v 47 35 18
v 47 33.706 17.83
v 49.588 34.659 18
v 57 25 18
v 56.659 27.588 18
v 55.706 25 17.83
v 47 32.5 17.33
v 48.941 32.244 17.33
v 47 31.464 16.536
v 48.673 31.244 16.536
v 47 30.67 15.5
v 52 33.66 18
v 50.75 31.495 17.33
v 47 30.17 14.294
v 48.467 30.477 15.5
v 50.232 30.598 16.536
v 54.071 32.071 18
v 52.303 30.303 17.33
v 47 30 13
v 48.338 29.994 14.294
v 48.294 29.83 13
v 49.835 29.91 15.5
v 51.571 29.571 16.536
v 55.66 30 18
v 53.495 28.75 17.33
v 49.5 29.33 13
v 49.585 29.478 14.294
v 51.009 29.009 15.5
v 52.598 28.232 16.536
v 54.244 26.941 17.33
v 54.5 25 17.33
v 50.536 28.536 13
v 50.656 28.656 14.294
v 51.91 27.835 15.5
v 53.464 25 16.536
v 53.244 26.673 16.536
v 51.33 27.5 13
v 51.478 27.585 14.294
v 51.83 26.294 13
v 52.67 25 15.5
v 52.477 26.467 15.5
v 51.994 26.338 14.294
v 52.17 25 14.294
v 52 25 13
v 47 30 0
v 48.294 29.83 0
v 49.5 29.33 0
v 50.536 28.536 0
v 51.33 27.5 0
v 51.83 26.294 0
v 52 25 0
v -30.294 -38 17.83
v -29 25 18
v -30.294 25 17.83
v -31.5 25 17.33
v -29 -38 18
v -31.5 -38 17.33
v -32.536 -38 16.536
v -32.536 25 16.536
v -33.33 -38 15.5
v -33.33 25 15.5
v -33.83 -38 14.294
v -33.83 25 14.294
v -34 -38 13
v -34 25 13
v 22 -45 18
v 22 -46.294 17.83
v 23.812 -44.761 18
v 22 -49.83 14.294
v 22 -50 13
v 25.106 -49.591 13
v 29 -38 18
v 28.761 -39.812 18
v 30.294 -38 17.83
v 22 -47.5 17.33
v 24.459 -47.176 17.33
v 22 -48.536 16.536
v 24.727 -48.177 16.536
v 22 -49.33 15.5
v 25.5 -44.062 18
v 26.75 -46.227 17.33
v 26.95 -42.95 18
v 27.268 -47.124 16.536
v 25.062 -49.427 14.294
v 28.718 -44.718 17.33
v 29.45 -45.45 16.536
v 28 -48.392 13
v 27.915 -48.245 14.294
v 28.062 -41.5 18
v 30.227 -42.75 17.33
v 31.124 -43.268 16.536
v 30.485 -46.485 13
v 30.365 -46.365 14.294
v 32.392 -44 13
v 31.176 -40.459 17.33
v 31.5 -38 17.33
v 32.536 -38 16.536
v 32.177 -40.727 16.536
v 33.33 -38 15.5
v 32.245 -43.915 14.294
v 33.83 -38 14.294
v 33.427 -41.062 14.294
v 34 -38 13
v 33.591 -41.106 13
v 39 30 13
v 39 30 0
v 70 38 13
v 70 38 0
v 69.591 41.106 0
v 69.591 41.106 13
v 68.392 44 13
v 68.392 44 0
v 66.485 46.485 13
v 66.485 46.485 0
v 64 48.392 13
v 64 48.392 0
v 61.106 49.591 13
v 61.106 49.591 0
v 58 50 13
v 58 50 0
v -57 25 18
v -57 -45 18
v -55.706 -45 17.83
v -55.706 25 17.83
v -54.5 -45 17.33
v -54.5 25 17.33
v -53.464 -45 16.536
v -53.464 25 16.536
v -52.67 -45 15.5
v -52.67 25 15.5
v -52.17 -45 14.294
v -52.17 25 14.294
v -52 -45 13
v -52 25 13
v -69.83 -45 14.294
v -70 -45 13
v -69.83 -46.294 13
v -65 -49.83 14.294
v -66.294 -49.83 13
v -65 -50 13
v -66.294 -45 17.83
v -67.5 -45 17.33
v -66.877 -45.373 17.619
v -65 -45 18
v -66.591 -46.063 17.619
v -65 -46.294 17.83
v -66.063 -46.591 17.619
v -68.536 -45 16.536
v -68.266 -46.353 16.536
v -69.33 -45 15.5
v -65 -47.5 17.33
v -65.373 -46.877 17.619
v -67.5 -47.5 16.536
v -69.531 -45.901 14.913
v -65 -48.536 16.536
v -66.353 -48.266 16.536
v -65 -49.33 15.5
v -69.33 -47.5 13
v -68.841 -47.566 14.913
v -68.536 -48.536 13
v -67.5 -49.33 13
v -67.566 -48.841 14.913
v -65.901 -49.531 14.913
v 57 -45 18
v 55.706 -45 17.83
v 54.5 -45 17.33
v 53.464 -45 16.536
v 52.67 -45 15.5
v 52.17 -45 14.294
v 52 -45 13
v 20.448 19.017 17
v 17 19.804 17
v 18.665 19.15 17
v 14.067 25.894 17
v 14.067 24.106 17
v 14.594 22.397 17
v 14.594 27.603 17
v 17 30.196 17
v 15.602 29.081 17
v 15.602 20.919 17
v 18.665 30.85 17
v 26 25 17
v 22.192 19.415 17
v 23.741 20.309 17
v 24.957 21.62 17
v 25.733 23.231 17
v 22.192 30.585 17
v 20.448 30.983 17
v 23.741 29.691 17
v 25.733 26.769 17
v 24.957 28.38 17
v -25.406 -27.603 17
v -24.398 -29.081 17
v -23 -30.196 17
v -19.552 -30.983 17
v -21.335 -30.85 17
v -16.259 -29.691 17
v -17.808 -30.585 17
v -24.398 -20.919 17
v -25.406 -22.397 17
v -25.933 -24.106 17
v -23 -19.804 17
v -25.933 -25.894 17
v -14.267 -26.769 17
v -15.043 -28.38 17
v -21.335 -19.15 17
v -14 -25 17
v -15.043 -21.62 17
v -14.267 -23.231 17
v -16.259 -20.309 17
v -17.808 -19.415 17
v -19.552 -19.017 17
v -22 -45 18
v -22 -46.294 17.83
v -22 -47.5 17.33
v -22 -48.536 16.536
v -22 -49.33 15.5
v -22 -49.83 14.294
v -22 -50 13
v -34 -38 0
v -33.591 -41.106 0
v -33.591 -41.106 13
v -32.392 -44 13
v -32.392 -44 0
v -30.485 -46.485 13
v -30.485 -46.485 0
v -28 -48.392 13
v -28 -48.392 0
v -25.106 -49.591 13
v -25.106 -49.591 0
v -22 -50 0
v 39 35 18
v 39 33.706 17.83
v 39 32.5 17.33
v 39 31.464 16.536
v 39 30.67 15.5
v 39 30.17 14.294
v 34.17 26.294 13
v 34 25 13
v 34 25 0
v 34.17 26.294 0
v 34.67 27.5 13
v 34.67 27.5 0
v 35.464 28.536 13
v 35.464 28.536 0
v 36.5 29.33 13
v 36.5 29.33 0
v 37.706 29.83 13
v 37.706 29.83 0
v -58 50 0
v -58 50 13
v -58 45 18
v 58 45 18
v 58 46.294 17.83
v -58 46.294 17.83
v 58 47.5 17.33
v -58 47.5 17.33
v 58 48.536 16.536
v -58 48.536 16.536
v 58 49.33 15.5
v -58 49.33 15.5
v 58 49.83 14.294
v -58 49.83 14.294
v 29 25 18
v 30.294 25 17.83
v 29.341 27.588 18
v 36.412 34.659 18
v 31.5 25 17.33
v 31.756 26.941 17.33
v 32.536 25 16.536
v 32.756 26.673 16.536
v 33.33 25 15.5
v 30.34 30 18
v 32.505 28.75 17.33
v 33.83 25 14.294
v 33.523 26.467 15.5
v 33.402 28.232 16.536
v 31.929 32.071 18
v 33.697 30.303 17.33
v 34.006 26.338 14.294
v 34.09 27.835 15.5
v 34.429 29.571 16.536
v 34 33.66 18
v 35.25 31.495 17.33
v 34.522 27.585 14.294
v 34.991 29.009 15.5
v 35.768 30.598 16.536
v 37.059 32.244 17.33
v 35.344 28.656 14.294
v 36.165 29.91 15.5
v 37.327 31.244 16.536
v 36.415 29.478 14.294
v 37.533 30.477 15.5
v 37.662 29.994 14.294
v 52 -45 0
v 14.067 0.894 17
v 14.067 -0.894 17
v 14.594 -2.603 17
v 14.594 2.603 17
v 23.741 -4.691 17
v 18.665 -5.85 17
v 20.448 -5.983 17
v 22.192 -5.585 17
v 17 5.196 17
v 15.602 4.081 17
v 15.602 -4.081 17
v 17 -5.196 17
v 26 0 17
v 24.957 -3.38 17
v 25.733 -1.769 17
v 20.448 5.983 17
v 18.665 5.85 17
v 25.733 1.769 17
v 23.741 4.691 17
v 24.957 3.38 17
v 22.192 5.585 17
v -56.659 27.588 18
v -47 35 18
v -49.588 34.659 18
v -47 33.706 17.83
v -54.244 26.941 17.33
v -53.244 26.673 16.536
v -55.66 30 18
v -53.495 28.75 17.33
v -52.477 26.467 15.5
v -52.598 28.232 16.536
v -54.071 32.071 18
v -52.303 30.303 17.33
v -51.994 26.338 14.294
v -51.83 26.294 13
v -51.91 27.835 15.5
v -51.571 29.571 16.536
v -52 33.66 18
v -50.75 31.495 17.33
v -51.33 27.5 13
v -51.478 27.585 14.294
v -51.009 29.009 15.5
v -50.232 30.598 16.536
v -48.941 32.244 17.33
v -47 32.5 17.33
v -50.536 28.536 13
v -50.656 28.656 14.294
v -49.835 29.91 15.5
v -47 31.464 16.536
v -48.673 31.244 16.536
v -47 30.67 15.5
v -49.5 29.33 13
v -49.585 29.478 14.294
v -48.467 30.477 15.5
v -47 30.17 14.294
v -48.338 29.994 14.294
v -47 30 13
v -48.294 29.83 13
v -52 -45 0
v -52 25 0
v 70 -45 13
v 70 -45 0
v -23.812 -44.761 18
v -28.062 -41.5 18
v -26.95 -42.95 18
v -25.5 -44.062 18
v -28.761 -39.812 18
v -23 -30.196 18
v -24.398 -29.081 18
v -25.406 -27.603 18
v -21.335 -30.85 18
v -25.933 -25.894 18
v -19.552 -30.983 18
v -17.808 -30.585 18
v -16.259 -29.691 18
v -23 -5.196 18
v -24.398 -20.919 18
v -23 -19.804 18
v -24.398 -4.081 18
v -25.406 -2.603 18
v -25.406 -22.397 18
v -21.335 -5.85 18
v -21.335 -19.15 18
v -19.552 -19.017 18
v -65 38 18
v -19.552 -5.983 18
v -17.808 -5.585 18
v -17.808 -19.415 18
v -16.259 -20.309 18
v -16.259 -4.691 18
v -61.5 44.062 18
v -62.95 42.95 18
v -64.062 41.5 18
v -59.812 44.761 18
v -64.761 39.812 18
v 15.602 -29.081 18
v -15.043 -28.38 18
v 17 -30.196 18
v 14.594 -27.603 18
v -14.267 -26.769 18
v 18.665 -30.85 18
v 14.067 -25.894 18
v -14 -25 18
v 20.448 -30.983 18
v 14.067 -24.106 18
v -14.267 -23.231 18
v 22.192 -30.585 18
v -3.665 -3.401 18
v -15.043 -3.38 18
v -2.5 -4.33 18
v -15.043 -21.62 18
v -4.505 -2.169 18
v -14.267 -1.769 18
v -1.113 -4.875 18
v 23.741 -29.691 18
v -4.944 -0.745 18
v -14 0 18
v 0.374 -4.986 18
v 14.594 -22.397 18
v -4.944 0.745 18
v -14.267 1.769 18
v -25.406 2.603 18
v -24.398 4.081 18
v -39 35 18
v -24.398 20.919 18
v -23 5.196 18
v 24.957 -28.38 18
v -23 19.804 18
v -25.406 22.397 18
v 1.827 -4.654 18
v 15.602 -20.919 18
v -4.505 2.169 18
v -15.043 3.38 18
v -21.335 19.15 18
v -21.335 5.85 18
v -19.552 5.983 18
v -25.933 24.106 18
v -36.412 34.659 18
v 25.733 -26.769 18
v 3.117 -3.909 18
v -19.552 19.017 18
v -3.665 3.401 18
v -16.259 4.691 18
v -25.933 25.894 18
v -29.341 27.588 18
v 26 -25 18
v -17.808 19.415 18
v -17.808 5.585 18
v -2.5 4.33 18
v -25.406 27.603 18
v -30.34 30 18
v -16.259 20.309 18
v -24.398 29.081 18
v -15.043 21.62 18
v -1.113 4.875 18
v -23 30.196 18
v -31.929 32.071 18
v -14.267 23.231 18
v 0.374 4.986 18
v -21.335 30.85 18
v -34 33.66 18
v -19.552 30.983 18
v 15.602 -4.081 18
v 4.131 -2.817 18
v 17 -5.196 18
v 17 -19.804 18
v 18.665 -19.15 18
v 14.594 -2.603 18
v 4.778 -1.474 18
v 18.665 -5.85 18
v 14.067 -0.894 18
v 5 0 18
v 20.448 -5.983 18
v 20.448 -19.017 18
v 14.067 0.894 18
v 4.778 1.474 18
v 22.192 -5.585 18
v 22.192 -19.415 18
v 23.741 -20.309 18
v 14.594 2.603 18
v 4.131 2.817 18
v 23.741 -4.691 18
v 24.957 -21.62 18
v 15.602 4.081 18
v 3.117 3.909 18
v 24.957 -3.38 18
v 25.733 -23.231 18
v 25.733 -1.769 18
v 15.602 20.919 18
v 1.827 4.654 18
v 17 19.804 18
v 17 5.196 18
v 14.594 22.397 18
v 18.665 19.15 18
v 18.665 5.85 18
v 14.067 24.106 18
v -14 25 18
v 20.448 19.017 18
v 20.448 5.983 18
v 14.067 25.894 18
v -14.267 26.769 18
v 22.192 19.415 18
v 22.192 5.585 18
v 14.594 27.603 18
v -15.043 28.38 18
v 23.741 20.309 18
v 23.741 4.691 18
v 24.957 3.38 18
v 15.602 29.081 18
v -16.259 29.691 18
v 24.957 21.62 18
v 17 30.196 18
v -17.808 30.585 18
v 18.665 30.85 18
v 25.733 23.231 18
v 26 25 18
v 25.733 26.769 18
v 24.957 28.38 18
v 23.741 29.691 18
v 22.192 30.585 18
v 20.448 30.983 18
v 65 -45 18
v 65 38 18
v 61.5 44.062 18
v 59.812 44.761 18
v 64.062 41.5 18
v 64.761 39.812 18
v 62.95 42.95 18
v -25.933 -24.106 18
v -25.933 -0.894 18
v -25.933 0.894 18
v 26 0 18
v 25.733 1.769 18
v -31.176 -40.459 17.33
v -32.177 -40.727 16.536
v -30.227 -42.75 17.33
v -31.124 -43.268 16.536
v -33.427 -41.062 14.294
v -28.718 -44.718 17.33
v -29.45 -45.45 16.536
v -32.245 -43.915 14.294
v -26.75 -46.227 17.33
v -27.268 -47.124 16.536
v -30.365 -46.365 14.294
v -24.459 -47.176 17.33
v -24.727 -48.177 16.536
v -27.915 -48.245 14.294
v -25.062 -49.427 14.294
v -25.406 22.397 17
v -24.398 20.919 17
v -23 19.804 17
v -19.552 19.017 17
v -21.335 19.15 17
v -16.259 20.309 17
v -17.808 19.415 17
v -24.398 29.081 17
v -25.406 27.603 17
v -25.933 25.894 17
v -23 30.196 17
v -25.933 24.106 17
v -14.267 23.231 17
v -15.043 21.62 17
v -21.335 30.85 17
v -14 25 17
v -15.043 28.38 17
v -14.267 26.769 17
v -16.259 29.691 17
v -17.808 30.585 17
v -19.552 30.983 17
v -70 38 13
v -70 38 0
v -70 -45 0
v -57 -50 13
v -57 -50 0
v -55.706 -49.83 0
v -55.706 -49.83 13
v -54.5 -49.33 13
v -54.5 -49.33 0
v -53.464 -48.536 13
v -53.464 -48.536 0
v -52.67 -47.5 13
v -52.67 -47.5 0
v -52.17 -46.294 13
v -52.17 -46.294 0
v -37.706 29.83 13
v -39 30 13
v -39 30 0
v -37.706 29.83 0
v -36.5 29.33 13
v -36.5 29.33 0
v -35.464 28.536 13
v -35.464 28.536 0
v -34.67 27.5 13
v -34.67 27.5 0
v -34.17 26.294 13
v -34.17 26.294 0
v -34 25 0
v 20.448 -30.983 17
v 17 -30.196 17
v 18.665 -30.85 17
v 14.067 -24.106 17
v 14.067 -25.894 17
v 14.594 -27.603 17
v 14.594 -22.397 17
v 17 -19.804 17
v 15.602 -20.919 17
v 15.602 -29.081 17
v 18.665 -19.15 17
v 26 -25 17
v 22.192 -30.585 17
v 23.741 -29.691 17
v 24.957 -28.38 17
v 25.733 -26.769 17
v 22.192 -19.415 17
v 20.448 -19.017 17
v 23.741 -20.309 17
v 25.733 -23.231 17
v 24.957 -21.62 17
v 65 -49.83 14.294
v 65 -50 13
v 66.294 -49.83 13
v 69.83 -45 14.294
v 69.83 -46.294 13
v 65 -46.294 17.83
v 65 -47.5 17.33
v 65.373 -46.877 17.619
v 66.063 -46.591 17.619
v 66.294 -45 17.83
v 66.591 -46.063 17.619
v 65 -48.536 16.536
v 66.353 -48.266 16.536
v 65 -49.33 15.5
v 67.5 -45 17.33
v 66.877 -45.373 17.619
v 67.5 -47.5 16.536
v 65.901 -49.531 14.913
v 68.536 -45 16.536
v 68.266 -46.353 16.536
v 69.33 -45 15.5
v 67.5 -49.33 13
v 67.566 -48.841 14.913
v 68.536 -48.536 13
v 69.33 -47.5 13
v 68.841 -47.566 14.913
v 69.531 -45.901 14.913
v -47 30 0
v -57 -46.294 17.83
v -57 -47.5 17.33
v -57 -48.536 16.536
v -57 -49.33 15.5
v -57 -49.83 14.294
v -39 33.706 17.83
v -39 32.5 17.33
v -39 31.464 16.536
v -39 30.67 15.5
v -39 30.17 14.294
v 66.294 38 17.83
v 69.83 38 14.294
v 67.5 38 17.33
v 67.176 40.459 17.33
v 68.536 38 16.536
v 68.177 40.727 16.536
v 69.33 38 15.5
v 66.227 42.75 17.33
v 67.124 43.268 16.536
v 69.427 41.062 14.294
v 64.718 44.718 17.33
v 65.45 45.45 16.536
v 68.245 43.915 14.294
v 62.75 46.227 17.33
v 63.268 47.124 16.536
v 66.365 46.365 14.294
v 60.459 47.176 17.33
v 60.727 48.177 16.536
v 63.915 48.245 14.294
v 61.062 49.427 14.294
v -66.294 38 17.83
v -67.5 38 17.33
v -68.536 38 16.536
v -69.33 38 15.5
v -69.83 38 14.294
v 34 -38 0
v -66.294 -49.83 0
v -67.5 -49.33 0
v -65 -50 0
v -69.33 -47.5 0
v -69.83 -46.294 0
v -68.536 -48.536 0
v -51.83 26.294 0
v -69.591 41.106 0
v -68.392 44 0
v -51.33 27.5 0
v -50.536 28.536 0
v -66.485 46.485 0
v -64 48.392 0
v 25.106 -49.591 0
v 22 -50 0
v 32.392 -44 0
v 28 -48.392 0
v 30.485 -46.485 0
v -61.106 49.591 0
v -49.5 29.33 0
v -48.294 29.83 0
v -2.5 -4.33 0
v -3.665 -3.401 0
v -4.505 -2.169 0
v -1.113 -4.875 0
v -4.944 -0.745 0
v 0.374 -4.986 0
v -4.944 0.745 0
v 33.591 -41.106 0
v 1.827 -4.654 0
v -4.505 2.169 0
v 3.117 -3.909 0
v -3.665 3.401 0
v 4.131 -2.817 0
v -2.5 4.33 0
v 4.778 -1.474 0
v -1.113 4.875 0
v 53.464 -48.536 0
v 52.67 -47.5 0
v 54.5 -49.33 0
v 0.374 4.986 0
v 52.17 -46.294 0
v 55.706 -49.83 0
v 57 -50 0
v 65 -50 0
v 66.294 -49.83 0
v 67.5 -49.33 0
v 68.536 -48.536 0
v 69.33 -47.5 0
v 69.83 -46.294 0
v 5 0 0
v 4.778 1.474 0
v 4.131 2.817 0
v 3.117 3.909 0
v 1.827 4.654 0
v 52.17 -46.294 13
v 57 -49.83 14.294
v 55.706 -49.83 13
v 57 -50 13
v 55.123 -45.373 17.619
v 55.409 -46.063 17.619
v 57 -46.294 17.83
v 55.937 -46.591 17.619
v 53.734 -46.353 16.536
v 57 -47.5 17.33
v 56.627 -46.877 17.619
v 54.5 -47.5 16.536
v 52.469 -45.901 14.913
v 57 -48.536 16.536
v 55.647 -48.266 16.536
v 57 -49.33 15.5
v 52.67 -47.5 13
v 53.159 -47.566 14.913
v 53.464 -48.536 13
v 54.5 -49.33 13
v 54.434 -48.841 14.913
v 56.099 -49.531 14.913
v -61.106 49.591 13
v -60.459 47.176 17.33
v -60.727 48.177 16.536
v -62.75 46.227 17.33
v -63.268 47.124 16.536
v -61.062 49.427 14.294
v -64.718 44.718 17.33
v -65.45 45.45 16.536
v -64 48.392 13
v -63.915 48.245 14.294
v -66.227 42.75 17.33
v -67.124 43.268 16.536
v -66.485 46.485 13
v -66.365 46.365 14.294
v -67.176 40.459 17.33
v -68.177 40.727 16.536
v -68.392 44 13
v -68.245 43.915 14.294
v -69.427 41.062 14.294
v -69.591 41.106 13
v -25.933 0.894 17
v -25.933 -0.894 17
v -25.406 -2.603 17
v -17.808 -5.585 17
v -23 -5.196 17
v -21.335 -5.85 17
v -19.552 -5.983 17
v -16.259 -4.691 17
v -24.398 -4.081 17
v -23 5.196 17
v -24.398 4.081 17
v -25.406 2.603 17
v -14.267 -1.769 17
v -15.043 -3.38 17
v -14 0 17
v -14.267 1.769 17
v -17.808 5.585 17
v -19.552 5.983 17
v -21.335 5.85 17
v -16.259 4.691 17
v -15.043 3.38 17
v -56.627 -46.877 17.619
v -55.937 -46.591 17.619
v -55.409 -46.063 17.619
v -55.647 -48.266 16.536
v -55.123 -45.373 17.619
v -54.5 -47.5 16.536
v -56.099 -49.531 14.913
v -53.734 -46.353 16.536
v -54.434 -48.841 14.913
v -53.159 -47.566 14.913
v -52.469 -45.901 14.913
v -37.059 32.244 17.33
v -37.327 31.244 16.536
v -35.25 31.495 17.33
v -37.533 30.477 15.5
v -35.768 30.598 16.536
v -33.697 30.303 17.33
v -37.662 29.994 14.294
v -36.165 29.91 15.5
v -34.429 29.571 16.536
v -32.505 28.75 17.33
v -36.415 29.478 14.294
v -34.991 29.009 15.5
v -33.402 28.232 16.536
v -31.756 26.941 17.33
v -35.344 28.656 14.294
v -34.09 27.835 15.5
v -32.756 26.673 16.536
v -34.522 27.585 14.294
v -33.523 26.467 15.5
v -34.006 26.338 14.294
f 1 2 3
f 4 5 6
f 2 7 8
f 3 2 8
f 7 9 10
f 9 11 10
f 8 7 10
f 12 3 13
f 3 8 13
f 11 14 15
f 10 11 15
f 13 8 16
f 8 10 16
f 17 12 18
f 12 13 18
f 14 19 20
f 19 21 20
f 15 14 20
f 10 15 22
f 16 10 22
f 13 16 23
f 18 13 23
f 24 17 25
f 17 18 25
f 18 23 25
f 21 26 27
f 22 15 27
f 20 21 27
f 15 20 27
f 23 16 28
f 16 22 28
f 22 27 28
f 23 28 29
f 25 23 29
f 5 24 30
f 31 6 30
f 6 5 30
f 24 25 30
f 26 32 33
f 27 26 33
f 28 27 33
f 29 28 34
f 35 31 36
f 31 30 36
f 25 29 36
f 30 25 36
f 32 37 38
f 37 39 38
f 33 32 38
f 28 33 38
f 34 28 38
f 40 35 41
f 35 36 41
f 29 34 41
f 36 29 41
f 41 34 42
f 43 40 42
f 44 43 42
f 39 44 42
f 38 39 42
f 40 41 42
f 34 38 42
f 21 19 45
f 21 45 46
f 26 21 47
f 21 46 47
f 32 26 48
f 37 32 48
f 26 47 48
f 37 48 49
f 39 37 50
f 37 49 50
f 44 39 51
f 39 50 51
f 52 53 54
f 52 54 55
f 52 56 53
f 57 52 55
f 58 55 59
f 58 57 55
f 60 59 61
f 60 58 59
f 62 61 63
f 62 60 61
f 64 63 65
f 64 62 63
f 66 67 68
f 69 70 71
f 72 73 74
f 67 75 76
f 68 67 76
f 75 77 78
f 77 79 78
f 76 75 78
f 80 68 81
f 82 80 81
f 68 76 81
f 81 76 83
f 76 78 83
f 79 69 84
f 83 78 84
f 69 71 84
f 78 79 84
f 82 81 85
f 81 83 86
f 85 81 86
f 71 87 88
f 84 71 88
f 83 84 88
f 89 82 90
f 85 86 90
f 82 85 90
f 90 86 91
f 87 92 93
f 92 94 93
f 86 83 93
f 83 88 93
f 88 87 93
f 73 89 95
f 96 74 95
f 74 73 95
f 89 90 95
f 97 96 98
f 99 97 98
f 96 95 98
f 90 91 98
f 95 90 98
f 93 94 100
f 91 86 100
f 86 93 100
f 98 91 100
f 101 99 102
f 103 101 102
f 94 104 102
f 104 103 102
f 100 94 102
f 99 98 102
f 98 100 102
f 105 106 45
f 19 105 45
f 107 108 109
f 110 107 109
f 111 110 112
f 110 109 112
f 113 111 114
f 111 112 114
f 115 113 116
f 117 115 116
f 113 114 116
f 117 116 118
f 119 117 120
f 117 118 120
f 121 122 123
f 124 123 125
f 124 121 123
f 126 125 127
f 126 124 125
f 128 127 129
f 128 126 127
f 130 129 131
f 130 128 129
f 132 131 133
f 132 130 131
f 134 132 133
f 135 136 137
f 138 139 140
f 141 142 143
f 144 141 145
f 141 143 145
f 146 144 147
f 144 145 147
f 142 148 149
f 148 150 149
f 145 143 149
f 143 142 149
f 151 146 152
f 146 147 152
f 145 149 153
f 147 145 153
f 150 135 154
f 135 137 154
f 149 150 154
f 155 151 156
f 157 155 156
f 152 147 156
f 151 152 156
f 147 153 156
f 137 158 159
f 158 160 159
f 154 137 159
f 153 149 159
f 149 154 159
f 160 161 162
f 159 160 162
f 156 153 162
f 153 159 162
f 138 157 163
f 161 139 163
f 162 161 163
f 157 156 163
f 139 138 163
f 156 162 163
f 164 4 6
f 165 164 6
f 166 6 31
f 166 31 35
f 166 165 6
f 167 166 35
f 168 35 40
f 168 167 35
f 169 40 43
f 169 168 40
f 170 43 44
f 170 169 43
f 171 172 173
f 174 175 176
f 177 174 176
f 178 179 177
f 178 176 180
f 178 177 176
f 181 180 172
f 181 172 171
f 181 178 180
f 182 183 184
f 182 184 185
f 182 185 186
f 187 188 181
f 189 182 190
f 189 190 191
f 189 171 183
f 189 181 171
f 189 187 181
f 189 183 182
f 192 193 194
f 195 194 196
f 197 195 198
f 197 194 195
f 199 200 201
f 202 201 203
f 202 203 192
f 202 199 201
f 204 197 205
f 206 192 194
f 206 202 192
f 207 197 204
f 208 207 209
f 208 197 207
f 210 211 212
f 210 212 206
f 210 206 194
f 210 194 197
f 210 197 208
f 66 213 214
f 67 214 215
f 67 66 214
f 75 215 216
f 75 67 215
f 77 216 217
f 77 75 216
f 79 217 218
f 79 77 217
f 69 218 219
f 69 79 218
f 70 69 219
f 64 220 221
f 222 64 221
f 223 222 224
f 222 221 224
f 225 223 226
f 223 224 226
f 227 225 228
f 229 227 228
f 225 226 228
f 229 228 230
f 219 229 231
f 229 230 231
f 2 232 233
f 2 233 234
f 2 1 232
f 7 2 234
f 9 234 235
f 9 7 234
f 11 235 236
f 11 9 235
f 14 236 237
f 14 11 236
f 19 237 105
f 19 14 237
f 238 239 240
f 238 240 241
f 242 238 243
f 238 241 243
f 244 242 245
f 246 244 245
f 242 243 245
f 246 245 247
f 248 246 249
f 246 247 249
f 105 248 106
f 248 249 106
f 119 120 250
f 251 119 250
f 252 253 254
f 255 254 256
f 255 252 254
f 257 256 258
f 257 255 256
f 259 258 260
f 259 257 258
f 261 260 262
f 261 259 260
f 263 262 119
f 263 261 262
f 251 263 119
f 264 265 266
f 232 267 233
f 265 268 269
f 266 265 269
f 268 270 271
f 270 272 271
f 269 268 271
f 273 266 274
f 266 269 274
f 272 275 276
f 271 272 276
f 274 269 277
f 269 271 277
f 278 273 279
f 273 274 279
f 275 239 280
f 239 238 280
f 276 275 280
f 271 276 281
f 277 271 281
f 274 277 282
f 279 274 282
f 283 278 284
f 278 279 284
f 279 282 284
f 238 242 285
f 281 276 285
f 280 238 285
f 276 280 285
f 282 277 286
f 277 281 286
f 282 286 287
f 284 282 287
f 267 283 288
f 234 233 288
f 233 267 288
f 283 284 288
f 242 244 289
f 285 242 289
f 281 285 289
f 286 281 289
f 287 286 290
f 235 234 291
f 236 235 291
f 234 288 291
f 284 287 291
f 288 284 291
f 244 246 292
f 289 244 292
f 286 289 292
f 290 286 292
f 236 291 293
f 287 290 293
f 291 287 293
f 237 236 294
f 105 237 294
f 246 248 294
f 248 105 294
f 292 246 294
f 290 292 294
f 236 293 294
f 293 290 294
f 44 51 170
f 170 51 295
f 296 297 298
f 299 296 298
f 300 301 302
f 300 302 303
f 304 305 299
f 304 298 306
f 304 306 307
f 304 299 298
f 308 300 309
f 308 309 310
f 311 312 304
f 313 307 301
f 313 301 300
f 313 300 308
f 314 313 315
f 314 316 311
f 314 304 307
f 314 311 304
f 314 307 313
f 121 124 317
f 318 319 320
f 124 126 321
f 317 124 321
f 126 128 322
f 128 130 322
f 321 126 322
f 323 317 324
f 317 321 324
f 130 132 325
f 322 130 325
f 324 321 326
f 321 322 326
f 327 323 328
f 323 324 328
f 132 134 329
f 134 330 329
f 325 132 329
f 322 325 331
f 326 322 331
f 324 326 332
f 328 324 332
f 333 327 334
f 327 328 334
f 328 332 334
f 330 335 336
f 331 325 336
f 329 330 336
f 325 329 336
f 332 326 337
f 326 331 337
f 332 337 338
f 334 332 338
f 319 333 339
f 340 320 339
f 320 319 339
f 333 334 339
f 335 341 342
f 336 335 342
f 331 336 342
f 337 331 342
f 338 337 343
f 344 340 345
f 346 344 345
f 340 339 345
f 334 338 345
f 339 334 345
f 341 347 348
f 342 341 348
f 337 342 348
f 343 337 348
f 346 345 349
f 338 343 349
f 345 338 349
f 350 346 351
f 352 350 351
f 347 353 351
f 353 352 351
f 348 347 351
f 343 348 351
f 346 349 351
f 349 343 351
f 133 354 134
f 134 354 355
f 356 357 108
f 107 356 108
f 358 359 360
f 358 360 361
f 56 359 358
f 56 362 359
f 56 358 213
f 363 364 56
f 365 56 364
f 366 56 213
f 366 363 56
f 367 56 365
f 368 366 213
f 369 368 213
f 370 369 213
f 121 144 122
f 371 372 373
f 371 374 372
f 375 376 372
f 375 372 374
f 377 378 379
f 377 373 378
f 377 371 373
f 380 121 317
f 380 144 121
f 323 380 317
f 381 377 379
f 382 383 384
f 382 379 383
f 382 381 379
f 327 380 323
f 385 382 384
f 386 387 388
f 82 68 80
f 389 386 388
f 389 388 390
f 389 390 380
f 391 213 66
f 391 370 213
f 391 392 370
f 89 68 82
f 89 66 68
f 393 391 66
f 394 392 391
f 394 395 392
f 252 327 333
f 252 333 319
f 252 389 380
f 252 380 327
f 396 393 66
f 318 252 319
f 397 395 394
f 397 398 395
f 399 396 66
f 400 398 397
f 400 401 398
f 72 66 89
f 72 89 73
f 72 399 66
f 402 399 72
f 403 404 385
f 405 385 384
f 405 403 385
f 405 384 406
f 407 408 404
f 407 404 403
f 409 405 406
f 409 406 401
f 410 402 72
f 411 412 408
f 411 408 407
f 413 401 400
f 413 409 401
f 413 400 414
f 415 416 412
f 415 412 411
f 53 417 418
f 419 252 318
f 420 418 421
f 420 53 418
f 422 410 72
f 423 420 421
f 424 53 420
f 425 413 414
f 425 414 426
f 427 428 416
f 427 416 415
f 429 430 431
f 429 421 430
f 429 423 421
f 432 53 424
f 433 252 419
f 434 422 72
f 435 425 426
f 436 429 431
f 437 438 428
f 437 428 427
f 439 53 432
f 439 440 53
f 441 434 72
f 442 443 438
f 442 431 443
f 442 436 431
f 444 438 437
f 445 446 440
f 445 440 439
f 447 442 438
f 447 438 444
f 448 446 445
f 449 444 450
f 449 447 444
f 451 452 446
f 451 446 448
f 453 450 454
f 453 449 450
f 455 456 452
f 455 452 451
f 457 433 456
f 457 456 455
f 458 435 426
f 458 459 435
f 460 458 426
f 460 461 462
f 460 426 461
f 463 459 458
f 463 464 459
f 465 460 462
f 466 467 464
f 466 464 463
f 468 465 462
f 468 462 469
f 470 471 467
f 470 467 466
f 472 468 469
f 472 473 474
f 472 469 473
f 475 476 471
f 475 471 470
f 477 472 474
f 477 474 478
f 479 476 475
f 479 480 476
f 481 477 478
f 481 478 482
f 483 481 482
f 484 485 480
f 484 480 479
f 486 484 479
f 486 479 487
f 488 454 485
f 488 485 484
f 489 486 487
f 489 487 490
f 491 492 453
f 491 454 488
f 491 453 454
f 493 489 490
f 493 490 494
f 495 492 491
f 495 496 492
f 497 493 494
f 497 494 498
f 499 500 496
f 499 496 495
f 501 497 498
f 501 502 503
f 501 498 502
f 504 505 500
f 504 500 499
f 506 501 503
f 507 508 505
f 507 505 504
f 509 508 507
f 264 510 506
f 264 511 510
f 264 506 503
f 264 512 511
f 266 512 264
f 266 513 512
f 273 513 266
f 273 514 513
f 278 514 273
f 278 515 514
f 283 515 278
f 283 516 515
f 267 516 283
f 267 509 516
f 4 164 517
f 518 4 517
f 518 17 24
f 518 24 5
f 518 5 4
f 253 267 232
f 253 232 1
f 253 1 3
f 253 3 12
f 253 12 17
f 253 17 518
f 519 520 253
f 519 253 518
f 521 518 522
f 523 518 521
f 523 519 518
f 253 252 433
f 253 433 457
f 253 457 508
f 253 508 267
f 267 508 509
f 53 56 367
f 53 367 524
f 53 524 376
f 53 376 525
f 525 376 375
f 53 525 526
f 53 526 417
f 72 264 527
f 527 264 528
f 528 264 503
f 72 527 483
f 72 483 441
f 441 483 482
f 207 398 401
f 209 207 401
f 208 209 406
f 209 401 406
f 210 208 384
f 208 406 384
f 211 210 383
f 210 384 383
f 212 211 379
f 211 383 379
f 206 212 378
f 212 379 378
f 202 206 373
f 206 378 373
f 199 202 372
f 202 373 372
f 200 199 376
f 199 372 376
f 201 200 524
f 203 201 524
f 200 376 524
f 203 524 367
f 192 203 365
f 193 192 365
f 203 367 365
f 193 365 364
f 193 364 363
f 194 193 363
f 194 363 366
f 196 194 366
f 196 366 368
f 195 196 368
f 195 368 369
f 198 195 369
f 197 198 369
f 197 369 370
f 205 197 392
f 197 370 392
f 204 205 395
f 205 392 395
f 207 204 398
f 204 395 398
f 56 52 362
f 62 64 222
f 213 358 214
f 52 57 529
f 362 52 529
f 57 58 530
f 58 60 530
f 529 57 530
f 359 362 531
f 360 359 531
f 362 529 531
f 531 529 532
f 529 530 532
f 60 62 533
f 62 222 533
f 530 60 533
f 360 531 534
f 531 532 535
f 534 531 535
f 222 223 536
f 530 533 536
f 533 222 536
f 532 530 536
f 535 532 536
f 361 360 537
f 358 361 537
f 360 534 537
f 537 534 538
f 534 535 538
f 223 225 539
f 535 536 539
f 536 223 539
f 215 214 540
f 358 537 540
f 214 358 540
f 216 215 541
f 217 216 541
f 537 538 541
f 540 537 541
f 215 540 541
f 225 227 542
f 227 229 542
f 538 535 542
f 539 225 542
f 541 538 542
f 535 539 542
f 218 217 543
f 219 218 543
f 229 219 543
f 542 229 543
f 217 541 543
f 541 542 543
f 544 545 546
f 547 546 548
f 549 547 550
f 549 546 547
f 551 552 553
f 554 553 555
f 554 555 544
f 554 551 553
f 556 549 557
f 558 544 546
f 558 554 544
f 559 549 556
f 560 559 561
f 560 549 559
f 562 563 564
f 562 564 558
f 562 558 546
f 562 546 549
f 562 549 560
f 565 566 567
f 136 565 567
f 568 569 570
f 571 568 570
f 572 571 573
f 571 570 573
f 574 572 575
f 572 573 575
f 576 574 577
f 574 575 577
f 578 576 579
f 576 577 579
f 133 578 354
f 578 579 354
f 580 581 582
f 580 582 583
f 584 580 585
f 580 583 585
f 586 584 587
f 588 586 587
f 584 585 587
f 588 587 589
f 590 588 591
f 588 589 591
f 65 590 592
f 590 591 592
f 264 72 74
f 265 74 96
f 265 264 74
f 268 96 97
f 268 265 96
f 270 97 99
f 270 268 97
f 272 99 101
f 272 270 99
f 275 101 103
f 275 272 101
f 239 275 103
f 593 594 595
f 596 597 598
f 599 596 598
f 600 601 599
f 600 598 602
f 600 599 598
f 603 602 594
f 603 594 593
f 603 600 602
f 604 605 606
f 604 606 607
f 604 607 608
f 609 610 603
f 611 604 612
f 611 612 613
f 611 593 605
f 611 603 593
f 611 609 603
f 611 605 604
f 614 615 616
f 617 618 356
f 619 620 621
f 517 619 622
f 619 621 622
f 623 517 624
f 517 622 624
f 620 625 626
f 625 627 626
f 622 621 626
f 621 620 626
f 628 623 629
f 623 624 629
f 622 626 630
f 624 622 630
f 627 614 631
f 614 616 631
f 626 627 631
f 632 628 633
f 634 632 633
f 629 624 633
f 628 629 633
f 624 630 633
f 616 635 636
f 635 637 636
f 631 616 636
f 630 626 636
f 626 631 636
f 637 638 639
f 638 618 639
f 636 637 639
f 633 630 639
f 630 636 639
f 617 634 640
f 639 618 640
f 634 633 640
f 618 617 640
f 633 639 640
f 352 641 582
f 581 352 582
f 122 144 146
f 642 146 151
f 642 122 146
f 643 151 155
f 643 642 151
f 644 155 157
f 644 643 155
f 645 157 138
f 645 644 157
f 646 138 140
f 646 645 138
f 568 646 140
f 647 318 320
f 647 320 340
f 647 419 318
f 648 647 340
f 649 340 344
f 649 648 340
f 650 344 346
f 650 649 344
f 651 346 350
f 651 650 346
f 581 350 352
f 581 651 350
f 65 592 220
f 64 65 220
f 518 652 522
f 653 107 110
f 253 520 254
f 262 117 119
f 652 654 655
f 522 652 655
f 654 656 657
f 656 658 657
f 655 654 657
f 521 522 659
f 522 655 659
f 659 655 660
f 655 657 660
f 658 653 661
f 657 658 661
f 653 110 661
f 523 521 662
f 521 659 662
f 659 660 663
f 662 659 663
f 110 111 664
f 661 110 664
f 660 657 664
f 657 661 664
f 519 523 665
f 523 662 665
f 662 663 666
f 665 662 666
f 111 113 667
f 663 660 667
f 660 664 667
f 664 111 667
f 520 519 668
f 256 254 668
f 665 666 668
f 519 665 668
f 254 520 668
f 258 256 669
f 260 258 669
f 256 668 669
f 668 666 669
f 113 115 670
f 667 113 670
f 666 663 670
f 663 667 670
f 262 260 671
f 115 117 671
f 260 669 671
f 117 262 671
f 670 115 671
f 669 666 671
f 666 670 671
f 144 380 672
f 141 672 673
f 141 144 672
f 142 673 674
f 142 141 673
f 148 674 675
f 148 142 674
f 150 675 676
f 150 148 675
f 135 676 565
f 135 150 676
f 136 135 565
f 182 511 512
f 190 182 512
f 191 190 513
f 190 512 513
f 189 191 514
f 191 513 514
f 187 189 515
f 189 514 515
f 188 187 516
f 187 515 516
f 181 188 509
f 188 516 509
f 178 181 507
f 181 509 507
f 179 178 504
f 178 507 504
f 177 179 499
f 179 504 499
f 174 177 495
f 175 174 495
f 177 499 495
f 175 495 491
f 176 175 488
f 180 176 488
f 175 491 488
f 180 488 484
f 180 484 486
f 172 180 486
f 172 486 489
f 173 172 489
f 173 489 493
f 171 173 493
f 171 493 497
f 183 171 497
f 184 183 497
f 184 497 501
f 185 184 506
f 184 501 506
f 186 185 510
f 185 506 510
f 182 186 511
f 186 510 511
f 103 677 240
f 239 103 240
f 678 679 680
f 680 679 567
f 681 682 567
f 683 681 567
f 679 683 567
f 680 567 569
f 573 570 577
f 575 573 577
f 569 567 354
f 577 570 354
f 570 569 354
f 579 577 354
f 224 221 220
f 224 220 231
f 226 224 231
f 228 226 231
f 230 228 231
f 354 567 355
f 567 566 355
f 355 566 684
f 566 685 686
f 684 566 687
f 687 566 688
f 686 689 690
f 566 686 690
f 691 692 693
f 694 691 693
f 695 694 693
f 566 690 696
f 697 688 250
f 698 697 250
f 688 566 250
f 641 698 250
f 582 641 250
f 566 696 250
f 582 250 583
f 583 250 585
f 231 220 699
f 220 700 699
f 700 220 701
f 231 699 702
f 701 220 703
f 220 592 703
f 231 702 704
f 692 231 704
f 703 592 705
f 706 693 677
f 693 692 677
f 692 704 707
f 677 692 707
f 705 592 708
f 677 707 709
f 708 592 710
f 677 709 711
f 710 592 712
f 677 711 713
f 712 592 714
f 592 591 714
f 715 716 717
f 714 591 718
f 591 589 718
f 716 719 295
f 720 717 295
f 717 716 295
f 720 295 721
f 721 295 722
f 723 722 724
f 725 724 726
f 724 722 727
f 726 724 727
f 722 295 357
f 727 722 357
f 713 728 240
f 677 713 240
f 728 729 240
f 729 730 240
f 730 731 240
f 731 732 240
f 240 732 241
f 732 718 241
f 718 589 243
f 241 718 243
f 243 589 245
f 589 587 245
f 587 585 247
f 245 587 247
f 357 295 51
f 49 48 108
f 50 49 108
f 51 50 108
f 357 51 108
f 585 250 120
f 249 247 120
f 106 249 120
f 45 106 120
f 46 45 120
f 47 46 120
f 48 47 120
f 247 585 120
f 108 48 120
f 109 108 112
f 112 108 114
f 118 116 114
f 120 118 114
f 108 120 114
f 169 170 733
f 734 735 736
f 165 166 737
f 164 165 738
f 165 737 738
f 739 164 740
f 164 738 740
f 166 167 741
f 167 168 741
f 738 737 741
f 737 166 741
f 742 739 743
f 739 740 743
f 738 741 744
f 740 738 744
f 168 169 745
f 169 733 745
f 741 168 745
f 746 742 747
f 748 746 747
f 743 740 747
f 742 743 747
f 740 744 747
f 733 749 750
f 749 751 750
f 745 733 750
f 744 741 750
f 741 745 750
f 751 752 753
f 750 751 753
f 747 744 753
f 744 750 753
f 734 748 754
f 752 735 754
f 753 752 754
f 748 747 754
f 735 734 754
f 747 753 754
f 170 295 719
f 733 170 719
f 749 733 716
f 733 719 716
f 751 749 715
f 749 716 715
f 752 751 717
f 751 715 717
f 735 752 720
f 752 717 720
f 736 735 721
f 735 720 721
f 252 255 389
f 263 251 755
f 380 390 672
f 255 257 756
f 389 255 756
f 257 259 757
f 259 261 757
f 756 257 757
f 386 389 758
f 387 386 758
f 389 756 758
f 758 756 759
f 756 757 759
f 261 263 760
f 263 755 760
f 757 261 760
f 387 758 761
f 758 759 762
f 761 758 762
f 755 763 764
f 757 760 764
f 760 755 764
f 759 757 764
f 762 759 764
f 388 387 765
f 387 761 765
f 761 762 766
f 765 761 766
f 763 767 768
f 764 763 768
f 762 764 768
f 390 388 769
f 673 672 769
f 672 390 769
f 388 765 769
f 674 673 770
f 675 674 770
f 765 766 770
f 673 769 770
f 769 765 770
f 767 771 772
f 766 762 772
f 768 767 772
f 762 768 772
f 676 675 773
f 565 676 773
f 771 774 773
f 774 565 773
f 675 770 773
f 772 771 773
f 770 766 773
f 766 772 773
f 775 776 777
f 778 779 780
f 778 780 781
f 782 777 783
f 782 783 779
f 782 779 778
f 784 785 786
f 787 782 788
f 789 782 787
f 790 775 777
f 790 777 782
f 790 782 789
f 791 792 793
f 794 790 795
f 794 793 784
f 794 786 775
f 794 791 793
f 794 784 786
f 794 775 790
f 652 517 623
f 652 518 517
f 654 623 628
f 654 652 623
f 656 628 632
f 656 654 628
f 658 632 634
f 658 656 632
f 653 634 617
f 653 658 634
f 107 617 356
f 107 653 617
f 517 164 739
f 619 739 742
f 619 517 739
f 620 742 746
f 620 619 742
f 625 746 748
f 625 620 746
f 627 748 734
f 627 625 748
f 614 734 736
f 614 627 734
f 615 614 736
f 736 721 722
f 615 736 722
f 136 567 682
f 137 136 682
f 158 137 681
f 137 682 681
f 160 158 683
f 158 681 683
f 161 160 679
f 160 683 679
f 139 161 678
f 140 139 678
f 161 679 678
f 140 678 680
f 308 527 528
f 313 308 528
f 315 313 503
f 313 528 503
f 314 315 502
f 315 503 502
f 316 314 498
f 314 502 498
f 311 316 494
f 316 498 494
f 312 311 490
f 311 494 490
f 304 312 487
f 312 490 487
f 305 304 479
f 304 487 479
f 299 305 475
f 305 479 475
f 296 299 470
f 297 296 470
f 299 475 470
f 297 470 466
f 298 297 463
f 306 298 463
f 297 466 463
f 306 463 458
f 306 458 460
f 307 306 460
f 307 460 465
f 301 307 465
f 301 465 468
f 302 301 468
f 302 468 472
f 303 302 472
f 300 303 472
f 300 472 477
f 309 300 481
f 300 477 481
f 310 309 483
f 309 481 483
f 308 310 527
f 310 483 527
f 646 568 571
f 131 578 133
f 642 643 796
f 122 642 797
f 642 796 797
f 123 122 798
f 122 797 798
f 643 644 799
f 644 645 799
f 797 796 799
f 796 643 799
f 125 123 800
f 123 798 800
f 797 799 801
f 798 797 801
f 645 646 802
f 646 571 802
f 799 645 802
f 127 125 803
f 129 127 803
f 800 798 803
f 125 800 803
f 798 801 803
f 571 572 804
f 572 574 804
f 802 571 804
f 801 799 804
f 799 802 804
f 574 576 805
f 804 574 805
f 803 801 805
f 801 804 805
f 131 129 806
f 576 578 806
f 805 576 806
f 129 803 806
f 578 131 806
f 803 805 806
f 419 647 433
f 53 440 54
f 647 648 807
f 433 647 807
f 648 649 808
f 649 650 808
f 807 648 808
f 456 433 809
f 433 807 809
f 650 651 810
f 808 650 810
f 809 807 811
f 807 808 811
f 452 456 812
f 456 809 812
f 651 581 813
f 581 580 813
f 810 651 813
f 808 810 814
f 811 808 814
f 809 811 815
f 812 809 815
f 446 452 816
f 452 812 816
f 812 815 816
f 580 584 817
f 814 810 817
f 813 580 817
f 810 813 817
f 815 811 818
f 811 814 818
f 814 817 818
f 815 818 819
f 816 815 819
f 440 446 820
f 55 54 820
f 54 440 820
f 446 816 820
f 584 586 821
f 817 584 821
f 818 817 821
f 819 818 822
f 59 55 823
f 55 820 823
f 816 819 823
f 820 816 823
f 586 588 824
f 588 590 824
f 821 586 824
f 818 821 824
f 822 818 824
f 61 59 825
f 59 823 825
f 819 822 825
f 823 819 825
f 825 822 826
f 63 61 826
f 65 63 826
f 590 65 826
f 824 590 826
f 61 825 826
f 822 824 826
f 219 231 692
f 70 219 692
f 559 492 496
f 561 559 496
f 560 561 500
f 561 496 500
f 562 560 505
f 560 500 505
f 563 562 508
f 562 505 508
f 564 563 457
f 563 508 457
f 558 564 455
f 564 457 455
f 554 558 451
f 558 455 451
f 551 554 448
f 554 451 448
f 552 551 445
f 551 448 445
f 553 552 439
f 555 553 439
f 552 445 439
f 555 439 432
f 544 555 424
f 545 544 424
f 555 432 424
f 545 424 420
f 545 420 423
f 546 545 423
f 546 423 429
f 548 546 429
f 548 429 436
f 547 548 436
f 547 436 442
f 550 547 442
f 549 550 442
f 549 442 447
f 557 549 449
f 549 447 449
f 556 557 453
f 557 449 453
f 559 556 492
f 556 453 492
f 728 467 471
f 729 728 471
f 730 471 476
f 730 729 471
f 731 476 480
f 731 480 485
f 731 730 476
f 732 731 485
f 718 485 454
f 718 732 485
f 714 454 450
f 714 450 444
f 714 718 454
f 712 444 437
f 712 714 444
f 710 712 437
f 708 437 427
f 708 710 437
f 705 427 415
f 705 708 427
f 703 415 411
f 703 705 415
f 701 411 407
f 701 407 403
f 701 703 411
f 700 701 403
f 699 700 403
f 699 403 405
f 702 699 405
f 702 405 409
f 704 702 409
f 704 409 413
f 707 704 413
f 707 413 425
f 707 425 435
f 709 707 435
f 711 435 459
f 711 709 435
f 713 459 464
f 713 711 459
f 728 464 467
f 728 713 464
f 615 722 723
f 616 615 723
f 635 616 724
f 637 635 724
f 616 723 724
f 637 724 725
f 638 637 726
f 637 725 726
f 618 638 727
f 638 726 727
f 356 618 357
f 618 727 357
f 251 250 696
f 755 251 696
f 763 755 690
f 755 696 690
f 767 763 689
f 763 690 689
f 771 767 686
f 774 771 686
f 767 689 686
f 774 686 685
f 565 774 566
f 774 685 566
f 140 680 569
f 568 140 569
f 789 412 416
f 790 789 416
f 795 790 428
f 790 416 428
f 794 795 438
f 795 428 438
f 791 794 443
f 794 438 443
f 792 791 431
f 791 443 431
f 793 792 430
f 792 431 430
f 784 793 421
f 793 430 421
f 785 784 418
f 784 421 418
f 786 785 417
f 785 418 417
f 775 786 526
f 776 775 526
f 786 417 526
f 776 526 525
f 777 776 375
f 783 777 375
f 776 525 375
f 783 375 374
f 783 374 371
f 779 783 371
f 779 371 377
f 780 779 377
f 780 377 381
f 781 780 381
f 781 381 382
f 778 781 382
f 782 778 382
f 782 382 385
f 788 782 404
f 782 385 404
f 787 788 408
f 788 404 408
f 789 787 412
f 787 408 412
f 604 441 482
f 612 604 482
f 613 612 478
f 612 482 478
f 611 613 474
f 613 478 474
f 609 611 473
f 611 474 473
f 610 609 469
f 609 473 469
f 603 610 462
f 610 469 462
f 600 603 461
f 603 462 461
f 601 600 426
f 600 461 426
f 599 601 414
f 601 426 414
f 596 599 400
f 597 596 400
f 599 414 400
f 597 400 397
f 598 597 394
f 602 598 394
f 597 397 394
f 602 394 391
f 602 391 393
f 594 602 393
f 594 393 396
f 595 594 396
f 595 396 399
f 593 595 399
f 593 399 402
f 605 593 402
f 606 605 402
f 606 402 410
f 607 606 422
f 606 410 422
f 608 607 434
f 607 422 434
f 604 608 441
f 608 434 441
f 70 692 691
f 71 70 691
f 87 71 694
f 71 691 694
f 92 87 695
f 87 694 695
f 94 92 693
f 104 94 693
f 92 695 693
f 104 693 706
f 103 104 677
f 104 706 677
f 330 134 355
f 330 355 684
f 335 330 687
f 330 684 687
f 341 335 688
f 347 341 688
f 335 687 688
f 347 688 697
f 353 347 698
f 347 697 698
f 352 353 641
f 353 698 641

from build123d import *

# Parameters (mm, degrees)
F0_R     = 5
F1_DEPTH = 18
F2_R     = 6
F3_DEPTH = 1
F4_R     = 5


with BuildPart() as f1:
    # F0 (on Top) → F1 (new body)
    with BuildSketch(Plane.XY):
        with BuildLine():
            Line((0, -50), (22, -50))
            ThreePointArc((22, -50), (30.4852813742, -46.4852813742), (34, -38))
            Line((34, -38), (34, 25))
            ThreePointArc((34, 25), (35.4644660941, 28.5355339059), (39, 30))
            Line((39, 30), (47, 30))
            ThreePointArc((47, 30), (50.5355339059, 28.5355339059), (52, 25))
            Line((52, 25), (52, -45))
            ThreePointArc((52, -45), (53.4644660941, -48.5355339059), (57, -50))
            Line((57, -50), (65, -50))
            ThreePointArc((65, -50), (68.5355339059, -48.5355339059), (70, -45))
            Line((70, -45), (70, 38))
            ThreePointArc((70, 38), (66.4852813742, 46.4852813742), (58, 50))
            Line((58, 50), (0, 50))
            Line((0, 50), (-58, 50))
            ThreePointArc((-58, 50), (-66.4852813742, 46.4852813742), (-70, 38))
            Line((-70, 38), (-70, -45))
            ThreePointArc((-70, -45), (-68.5355339059, -48.5355339059), (-65, -50))
            Line((-65, -50), (-57, -50))
            ThreePointArc((-57, -50), (-53.4644660941, -48.5355339059), (-52, -45))
            Line((-52, -45), (-52, 25))
            ThreePointArc((-52, 25), (-50.5355339059, 28.5355339059), (-47, 30))
            Line((-47, 30), (-39, 30))
            ThreePointArc((-39, 30), (-35.4644660941, 28.5355339059), (-34, 25))
            Line((-34, 25), (-34, -38))
            ThreePointArc((-34, -38), (-30.4852813742, -46.4852813742), (-22, -50))
            Line((-22, -50), (0, -50))
        make_face()
        Circle(F0_R, mode=Mode.SUBTRACT)
    extrude(amount=F1_DEPTH)

    # F2 (on face) → F3 (cut)
    with BuildSketch(Plane.XY.offset(18)):
        with Locations((20, 0)):
            Circle(F2_R)
        with Locations((20, 25)):
            Circle(F2_R)
        with Locations((20, -25)):
            Circle(F2_R)
        with Locations((-20, 25)):
            Circle(F2_R)
        with Locations((-20, 0)):
            Circle(F2_R)
        with Locations((-20, -25)):
            Circle(F2_R)
    extrude(amount=-F3_DEPTH, mode=Mode.SUBTRACT)

    # F4
    f4_edges = [f1.edges().sort_by_distance(p)[0] for p in [
        (70, -3.5, 18),
    ]]
    fillet(f4_edges, radius=F4_R)


solid = f1.part
